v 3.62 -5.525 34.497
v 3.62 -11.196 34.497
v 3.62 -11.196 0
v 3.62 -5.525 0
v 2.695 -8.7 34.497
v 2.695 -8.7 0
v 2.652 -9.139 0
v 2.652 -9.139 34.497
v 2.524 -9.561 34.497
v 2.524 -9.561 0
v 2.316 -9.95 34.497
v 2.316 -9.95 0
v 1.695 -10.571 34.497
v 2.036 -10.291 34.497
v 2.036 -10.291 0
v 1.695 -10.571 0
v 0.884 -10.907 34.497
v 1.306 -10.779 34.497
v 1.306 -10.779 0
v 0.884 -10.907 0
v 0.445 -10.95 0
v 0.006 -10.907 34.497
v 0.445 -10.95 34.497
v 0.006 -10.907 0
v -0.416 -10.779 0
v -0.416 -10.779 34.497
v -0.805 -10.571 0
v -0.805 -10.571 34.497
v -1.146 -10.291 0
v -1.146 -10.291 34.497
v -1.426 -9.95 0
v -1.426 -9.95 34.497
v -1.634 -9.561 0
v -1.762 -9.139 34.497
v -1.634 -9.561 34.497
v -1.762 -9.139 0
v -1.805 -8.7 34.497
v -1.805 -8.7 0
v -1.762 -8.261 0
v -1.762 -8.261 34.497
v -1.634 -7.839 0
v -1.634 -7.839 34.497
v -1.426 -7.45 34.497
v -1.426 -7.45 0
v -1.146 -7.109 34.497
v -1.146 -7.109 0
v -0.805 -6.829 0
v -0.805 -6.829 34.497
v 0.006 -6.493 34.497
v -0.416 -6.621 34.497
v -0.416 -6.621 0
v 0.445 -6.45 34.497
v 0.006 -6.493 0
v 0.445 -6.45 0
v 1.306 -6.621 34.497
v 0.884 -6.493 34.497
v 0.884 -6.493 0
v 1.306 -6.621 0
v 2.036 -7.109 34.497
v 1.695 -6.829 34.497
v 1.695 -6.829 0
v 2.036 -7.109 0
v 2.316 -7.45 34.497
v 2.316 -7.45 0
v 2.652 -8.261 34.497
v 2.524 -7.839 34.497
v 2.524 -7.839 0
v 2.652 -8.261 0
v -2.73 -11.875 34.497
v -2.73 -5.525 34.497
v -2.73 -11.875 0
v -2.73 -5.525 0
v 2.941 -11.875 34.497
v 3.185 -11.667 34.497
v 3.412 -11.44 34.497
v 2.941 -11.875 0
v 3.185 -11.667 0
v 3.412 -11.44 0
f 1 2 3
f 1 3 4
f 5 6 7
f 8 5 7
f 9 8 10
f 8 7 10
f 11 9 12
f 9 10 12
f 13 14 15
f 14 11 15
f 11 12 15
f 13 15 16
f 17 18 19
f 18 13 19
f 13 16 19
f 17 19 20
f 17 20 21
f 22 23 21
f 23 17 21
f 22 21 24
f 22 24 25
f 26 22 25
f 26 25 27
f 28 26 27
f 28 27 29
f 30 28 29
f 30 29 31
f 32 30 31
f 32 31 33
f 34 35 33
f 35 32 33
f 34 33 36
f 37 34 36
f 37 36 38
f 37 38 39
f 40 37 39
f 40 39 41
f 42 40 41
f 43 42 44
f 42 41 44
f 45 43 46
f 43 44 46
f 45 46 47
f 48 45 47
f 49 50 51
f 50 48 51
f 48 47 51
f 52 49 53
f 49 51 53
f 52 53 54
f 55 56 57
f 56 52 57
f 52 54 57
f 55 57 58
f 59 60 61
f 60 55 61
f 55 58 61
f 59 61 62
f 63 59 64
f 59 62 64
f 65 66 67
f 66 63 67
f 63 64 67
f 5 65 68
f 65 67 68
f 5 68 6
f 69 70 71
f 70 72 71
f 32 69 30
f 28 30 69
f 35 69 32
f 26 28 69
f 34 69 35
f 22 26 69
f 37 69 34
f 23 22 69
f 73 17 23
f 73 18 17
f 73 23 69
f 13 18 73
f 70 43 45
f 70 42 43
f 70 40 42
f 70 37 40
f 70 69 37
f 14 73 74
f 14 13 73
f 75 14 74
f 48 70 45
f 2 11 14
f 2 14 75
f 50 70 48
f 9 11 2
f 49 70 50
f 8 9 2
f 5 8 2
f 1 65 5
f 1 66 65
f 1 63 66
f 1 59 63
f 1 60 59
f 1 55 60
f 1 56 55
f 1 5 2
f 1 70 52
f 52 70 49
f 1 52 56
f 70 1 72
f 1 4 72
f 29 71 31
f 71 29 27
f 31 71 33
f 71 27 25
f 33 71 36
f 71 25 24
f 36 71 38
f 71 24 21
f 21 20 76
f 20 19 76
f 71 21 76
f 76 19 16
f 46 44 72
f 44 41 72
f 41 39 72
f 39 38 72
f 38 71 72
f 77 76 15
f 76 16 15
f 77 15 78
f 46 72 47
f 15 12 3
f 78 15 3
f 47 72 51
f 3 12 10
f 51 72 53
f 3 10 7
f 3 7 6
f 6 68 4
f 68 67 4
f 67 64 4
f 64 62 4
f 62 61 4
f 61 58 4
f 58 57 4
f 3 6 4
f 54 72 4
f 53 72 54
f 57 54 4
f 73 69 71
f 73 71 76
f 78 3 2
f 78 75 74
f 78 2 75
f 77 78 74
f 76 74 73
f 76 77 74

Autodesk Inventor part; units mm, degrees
ref_plane "YZ Plane" through (0, 0, 0) normal (1, 0, 0) x (0, 1, 0)
ref_plane "XZ Plane" through (0, 0, 0) normal (0, 1, 0) x (-1, 0, 0)
ref_plane "Work Plane1" through (0, 0, 0) normal (0, 0, 1) x (1, 0, 0)
sketch "Sketch1" plane through (0, 0, 0) normal (0, 0, 1) x (1, 0, 0)
  circle A0 centre (0.445, -8.7) radius 2.25 construction
  circle A1 centre (0.445, -8.7) radius 2.25
  line L0 (3.62, -5.525) -> (-2.73, -5.525)
  line L1 (-2.73, -5.525) -> (-2.73, -11.875)
  line L2 (3.62, -5.525) -> (-2.73, -11.875) construction
  arc A2 (1.27, -12.7) -> (4.445, -9.525) centre (1.27, -9.525) ccw construction
  arc A3 (2.9413, -11.875) -> (3.62, -11.1963) centre (0.445, -8.7) ccw
  line L3 (3.62, -11.1963) -> (3.62, -5.525)
  line L4 (-2.73, -11.875) -> (2.9413, -11.875)
  point P0 (0, 0)
  dimension "d1" = 6.35
ref_plane "Work Plane2" through (-350.7586, -218.6666, 34.497) normal (0, 0, -1) x (-0.0253, 0.9997, 0)
extrude "Extrusion1" add sketch "Sketch1" along normal up to surface (34.497 mm away)
properties part number "odometry standoff"
